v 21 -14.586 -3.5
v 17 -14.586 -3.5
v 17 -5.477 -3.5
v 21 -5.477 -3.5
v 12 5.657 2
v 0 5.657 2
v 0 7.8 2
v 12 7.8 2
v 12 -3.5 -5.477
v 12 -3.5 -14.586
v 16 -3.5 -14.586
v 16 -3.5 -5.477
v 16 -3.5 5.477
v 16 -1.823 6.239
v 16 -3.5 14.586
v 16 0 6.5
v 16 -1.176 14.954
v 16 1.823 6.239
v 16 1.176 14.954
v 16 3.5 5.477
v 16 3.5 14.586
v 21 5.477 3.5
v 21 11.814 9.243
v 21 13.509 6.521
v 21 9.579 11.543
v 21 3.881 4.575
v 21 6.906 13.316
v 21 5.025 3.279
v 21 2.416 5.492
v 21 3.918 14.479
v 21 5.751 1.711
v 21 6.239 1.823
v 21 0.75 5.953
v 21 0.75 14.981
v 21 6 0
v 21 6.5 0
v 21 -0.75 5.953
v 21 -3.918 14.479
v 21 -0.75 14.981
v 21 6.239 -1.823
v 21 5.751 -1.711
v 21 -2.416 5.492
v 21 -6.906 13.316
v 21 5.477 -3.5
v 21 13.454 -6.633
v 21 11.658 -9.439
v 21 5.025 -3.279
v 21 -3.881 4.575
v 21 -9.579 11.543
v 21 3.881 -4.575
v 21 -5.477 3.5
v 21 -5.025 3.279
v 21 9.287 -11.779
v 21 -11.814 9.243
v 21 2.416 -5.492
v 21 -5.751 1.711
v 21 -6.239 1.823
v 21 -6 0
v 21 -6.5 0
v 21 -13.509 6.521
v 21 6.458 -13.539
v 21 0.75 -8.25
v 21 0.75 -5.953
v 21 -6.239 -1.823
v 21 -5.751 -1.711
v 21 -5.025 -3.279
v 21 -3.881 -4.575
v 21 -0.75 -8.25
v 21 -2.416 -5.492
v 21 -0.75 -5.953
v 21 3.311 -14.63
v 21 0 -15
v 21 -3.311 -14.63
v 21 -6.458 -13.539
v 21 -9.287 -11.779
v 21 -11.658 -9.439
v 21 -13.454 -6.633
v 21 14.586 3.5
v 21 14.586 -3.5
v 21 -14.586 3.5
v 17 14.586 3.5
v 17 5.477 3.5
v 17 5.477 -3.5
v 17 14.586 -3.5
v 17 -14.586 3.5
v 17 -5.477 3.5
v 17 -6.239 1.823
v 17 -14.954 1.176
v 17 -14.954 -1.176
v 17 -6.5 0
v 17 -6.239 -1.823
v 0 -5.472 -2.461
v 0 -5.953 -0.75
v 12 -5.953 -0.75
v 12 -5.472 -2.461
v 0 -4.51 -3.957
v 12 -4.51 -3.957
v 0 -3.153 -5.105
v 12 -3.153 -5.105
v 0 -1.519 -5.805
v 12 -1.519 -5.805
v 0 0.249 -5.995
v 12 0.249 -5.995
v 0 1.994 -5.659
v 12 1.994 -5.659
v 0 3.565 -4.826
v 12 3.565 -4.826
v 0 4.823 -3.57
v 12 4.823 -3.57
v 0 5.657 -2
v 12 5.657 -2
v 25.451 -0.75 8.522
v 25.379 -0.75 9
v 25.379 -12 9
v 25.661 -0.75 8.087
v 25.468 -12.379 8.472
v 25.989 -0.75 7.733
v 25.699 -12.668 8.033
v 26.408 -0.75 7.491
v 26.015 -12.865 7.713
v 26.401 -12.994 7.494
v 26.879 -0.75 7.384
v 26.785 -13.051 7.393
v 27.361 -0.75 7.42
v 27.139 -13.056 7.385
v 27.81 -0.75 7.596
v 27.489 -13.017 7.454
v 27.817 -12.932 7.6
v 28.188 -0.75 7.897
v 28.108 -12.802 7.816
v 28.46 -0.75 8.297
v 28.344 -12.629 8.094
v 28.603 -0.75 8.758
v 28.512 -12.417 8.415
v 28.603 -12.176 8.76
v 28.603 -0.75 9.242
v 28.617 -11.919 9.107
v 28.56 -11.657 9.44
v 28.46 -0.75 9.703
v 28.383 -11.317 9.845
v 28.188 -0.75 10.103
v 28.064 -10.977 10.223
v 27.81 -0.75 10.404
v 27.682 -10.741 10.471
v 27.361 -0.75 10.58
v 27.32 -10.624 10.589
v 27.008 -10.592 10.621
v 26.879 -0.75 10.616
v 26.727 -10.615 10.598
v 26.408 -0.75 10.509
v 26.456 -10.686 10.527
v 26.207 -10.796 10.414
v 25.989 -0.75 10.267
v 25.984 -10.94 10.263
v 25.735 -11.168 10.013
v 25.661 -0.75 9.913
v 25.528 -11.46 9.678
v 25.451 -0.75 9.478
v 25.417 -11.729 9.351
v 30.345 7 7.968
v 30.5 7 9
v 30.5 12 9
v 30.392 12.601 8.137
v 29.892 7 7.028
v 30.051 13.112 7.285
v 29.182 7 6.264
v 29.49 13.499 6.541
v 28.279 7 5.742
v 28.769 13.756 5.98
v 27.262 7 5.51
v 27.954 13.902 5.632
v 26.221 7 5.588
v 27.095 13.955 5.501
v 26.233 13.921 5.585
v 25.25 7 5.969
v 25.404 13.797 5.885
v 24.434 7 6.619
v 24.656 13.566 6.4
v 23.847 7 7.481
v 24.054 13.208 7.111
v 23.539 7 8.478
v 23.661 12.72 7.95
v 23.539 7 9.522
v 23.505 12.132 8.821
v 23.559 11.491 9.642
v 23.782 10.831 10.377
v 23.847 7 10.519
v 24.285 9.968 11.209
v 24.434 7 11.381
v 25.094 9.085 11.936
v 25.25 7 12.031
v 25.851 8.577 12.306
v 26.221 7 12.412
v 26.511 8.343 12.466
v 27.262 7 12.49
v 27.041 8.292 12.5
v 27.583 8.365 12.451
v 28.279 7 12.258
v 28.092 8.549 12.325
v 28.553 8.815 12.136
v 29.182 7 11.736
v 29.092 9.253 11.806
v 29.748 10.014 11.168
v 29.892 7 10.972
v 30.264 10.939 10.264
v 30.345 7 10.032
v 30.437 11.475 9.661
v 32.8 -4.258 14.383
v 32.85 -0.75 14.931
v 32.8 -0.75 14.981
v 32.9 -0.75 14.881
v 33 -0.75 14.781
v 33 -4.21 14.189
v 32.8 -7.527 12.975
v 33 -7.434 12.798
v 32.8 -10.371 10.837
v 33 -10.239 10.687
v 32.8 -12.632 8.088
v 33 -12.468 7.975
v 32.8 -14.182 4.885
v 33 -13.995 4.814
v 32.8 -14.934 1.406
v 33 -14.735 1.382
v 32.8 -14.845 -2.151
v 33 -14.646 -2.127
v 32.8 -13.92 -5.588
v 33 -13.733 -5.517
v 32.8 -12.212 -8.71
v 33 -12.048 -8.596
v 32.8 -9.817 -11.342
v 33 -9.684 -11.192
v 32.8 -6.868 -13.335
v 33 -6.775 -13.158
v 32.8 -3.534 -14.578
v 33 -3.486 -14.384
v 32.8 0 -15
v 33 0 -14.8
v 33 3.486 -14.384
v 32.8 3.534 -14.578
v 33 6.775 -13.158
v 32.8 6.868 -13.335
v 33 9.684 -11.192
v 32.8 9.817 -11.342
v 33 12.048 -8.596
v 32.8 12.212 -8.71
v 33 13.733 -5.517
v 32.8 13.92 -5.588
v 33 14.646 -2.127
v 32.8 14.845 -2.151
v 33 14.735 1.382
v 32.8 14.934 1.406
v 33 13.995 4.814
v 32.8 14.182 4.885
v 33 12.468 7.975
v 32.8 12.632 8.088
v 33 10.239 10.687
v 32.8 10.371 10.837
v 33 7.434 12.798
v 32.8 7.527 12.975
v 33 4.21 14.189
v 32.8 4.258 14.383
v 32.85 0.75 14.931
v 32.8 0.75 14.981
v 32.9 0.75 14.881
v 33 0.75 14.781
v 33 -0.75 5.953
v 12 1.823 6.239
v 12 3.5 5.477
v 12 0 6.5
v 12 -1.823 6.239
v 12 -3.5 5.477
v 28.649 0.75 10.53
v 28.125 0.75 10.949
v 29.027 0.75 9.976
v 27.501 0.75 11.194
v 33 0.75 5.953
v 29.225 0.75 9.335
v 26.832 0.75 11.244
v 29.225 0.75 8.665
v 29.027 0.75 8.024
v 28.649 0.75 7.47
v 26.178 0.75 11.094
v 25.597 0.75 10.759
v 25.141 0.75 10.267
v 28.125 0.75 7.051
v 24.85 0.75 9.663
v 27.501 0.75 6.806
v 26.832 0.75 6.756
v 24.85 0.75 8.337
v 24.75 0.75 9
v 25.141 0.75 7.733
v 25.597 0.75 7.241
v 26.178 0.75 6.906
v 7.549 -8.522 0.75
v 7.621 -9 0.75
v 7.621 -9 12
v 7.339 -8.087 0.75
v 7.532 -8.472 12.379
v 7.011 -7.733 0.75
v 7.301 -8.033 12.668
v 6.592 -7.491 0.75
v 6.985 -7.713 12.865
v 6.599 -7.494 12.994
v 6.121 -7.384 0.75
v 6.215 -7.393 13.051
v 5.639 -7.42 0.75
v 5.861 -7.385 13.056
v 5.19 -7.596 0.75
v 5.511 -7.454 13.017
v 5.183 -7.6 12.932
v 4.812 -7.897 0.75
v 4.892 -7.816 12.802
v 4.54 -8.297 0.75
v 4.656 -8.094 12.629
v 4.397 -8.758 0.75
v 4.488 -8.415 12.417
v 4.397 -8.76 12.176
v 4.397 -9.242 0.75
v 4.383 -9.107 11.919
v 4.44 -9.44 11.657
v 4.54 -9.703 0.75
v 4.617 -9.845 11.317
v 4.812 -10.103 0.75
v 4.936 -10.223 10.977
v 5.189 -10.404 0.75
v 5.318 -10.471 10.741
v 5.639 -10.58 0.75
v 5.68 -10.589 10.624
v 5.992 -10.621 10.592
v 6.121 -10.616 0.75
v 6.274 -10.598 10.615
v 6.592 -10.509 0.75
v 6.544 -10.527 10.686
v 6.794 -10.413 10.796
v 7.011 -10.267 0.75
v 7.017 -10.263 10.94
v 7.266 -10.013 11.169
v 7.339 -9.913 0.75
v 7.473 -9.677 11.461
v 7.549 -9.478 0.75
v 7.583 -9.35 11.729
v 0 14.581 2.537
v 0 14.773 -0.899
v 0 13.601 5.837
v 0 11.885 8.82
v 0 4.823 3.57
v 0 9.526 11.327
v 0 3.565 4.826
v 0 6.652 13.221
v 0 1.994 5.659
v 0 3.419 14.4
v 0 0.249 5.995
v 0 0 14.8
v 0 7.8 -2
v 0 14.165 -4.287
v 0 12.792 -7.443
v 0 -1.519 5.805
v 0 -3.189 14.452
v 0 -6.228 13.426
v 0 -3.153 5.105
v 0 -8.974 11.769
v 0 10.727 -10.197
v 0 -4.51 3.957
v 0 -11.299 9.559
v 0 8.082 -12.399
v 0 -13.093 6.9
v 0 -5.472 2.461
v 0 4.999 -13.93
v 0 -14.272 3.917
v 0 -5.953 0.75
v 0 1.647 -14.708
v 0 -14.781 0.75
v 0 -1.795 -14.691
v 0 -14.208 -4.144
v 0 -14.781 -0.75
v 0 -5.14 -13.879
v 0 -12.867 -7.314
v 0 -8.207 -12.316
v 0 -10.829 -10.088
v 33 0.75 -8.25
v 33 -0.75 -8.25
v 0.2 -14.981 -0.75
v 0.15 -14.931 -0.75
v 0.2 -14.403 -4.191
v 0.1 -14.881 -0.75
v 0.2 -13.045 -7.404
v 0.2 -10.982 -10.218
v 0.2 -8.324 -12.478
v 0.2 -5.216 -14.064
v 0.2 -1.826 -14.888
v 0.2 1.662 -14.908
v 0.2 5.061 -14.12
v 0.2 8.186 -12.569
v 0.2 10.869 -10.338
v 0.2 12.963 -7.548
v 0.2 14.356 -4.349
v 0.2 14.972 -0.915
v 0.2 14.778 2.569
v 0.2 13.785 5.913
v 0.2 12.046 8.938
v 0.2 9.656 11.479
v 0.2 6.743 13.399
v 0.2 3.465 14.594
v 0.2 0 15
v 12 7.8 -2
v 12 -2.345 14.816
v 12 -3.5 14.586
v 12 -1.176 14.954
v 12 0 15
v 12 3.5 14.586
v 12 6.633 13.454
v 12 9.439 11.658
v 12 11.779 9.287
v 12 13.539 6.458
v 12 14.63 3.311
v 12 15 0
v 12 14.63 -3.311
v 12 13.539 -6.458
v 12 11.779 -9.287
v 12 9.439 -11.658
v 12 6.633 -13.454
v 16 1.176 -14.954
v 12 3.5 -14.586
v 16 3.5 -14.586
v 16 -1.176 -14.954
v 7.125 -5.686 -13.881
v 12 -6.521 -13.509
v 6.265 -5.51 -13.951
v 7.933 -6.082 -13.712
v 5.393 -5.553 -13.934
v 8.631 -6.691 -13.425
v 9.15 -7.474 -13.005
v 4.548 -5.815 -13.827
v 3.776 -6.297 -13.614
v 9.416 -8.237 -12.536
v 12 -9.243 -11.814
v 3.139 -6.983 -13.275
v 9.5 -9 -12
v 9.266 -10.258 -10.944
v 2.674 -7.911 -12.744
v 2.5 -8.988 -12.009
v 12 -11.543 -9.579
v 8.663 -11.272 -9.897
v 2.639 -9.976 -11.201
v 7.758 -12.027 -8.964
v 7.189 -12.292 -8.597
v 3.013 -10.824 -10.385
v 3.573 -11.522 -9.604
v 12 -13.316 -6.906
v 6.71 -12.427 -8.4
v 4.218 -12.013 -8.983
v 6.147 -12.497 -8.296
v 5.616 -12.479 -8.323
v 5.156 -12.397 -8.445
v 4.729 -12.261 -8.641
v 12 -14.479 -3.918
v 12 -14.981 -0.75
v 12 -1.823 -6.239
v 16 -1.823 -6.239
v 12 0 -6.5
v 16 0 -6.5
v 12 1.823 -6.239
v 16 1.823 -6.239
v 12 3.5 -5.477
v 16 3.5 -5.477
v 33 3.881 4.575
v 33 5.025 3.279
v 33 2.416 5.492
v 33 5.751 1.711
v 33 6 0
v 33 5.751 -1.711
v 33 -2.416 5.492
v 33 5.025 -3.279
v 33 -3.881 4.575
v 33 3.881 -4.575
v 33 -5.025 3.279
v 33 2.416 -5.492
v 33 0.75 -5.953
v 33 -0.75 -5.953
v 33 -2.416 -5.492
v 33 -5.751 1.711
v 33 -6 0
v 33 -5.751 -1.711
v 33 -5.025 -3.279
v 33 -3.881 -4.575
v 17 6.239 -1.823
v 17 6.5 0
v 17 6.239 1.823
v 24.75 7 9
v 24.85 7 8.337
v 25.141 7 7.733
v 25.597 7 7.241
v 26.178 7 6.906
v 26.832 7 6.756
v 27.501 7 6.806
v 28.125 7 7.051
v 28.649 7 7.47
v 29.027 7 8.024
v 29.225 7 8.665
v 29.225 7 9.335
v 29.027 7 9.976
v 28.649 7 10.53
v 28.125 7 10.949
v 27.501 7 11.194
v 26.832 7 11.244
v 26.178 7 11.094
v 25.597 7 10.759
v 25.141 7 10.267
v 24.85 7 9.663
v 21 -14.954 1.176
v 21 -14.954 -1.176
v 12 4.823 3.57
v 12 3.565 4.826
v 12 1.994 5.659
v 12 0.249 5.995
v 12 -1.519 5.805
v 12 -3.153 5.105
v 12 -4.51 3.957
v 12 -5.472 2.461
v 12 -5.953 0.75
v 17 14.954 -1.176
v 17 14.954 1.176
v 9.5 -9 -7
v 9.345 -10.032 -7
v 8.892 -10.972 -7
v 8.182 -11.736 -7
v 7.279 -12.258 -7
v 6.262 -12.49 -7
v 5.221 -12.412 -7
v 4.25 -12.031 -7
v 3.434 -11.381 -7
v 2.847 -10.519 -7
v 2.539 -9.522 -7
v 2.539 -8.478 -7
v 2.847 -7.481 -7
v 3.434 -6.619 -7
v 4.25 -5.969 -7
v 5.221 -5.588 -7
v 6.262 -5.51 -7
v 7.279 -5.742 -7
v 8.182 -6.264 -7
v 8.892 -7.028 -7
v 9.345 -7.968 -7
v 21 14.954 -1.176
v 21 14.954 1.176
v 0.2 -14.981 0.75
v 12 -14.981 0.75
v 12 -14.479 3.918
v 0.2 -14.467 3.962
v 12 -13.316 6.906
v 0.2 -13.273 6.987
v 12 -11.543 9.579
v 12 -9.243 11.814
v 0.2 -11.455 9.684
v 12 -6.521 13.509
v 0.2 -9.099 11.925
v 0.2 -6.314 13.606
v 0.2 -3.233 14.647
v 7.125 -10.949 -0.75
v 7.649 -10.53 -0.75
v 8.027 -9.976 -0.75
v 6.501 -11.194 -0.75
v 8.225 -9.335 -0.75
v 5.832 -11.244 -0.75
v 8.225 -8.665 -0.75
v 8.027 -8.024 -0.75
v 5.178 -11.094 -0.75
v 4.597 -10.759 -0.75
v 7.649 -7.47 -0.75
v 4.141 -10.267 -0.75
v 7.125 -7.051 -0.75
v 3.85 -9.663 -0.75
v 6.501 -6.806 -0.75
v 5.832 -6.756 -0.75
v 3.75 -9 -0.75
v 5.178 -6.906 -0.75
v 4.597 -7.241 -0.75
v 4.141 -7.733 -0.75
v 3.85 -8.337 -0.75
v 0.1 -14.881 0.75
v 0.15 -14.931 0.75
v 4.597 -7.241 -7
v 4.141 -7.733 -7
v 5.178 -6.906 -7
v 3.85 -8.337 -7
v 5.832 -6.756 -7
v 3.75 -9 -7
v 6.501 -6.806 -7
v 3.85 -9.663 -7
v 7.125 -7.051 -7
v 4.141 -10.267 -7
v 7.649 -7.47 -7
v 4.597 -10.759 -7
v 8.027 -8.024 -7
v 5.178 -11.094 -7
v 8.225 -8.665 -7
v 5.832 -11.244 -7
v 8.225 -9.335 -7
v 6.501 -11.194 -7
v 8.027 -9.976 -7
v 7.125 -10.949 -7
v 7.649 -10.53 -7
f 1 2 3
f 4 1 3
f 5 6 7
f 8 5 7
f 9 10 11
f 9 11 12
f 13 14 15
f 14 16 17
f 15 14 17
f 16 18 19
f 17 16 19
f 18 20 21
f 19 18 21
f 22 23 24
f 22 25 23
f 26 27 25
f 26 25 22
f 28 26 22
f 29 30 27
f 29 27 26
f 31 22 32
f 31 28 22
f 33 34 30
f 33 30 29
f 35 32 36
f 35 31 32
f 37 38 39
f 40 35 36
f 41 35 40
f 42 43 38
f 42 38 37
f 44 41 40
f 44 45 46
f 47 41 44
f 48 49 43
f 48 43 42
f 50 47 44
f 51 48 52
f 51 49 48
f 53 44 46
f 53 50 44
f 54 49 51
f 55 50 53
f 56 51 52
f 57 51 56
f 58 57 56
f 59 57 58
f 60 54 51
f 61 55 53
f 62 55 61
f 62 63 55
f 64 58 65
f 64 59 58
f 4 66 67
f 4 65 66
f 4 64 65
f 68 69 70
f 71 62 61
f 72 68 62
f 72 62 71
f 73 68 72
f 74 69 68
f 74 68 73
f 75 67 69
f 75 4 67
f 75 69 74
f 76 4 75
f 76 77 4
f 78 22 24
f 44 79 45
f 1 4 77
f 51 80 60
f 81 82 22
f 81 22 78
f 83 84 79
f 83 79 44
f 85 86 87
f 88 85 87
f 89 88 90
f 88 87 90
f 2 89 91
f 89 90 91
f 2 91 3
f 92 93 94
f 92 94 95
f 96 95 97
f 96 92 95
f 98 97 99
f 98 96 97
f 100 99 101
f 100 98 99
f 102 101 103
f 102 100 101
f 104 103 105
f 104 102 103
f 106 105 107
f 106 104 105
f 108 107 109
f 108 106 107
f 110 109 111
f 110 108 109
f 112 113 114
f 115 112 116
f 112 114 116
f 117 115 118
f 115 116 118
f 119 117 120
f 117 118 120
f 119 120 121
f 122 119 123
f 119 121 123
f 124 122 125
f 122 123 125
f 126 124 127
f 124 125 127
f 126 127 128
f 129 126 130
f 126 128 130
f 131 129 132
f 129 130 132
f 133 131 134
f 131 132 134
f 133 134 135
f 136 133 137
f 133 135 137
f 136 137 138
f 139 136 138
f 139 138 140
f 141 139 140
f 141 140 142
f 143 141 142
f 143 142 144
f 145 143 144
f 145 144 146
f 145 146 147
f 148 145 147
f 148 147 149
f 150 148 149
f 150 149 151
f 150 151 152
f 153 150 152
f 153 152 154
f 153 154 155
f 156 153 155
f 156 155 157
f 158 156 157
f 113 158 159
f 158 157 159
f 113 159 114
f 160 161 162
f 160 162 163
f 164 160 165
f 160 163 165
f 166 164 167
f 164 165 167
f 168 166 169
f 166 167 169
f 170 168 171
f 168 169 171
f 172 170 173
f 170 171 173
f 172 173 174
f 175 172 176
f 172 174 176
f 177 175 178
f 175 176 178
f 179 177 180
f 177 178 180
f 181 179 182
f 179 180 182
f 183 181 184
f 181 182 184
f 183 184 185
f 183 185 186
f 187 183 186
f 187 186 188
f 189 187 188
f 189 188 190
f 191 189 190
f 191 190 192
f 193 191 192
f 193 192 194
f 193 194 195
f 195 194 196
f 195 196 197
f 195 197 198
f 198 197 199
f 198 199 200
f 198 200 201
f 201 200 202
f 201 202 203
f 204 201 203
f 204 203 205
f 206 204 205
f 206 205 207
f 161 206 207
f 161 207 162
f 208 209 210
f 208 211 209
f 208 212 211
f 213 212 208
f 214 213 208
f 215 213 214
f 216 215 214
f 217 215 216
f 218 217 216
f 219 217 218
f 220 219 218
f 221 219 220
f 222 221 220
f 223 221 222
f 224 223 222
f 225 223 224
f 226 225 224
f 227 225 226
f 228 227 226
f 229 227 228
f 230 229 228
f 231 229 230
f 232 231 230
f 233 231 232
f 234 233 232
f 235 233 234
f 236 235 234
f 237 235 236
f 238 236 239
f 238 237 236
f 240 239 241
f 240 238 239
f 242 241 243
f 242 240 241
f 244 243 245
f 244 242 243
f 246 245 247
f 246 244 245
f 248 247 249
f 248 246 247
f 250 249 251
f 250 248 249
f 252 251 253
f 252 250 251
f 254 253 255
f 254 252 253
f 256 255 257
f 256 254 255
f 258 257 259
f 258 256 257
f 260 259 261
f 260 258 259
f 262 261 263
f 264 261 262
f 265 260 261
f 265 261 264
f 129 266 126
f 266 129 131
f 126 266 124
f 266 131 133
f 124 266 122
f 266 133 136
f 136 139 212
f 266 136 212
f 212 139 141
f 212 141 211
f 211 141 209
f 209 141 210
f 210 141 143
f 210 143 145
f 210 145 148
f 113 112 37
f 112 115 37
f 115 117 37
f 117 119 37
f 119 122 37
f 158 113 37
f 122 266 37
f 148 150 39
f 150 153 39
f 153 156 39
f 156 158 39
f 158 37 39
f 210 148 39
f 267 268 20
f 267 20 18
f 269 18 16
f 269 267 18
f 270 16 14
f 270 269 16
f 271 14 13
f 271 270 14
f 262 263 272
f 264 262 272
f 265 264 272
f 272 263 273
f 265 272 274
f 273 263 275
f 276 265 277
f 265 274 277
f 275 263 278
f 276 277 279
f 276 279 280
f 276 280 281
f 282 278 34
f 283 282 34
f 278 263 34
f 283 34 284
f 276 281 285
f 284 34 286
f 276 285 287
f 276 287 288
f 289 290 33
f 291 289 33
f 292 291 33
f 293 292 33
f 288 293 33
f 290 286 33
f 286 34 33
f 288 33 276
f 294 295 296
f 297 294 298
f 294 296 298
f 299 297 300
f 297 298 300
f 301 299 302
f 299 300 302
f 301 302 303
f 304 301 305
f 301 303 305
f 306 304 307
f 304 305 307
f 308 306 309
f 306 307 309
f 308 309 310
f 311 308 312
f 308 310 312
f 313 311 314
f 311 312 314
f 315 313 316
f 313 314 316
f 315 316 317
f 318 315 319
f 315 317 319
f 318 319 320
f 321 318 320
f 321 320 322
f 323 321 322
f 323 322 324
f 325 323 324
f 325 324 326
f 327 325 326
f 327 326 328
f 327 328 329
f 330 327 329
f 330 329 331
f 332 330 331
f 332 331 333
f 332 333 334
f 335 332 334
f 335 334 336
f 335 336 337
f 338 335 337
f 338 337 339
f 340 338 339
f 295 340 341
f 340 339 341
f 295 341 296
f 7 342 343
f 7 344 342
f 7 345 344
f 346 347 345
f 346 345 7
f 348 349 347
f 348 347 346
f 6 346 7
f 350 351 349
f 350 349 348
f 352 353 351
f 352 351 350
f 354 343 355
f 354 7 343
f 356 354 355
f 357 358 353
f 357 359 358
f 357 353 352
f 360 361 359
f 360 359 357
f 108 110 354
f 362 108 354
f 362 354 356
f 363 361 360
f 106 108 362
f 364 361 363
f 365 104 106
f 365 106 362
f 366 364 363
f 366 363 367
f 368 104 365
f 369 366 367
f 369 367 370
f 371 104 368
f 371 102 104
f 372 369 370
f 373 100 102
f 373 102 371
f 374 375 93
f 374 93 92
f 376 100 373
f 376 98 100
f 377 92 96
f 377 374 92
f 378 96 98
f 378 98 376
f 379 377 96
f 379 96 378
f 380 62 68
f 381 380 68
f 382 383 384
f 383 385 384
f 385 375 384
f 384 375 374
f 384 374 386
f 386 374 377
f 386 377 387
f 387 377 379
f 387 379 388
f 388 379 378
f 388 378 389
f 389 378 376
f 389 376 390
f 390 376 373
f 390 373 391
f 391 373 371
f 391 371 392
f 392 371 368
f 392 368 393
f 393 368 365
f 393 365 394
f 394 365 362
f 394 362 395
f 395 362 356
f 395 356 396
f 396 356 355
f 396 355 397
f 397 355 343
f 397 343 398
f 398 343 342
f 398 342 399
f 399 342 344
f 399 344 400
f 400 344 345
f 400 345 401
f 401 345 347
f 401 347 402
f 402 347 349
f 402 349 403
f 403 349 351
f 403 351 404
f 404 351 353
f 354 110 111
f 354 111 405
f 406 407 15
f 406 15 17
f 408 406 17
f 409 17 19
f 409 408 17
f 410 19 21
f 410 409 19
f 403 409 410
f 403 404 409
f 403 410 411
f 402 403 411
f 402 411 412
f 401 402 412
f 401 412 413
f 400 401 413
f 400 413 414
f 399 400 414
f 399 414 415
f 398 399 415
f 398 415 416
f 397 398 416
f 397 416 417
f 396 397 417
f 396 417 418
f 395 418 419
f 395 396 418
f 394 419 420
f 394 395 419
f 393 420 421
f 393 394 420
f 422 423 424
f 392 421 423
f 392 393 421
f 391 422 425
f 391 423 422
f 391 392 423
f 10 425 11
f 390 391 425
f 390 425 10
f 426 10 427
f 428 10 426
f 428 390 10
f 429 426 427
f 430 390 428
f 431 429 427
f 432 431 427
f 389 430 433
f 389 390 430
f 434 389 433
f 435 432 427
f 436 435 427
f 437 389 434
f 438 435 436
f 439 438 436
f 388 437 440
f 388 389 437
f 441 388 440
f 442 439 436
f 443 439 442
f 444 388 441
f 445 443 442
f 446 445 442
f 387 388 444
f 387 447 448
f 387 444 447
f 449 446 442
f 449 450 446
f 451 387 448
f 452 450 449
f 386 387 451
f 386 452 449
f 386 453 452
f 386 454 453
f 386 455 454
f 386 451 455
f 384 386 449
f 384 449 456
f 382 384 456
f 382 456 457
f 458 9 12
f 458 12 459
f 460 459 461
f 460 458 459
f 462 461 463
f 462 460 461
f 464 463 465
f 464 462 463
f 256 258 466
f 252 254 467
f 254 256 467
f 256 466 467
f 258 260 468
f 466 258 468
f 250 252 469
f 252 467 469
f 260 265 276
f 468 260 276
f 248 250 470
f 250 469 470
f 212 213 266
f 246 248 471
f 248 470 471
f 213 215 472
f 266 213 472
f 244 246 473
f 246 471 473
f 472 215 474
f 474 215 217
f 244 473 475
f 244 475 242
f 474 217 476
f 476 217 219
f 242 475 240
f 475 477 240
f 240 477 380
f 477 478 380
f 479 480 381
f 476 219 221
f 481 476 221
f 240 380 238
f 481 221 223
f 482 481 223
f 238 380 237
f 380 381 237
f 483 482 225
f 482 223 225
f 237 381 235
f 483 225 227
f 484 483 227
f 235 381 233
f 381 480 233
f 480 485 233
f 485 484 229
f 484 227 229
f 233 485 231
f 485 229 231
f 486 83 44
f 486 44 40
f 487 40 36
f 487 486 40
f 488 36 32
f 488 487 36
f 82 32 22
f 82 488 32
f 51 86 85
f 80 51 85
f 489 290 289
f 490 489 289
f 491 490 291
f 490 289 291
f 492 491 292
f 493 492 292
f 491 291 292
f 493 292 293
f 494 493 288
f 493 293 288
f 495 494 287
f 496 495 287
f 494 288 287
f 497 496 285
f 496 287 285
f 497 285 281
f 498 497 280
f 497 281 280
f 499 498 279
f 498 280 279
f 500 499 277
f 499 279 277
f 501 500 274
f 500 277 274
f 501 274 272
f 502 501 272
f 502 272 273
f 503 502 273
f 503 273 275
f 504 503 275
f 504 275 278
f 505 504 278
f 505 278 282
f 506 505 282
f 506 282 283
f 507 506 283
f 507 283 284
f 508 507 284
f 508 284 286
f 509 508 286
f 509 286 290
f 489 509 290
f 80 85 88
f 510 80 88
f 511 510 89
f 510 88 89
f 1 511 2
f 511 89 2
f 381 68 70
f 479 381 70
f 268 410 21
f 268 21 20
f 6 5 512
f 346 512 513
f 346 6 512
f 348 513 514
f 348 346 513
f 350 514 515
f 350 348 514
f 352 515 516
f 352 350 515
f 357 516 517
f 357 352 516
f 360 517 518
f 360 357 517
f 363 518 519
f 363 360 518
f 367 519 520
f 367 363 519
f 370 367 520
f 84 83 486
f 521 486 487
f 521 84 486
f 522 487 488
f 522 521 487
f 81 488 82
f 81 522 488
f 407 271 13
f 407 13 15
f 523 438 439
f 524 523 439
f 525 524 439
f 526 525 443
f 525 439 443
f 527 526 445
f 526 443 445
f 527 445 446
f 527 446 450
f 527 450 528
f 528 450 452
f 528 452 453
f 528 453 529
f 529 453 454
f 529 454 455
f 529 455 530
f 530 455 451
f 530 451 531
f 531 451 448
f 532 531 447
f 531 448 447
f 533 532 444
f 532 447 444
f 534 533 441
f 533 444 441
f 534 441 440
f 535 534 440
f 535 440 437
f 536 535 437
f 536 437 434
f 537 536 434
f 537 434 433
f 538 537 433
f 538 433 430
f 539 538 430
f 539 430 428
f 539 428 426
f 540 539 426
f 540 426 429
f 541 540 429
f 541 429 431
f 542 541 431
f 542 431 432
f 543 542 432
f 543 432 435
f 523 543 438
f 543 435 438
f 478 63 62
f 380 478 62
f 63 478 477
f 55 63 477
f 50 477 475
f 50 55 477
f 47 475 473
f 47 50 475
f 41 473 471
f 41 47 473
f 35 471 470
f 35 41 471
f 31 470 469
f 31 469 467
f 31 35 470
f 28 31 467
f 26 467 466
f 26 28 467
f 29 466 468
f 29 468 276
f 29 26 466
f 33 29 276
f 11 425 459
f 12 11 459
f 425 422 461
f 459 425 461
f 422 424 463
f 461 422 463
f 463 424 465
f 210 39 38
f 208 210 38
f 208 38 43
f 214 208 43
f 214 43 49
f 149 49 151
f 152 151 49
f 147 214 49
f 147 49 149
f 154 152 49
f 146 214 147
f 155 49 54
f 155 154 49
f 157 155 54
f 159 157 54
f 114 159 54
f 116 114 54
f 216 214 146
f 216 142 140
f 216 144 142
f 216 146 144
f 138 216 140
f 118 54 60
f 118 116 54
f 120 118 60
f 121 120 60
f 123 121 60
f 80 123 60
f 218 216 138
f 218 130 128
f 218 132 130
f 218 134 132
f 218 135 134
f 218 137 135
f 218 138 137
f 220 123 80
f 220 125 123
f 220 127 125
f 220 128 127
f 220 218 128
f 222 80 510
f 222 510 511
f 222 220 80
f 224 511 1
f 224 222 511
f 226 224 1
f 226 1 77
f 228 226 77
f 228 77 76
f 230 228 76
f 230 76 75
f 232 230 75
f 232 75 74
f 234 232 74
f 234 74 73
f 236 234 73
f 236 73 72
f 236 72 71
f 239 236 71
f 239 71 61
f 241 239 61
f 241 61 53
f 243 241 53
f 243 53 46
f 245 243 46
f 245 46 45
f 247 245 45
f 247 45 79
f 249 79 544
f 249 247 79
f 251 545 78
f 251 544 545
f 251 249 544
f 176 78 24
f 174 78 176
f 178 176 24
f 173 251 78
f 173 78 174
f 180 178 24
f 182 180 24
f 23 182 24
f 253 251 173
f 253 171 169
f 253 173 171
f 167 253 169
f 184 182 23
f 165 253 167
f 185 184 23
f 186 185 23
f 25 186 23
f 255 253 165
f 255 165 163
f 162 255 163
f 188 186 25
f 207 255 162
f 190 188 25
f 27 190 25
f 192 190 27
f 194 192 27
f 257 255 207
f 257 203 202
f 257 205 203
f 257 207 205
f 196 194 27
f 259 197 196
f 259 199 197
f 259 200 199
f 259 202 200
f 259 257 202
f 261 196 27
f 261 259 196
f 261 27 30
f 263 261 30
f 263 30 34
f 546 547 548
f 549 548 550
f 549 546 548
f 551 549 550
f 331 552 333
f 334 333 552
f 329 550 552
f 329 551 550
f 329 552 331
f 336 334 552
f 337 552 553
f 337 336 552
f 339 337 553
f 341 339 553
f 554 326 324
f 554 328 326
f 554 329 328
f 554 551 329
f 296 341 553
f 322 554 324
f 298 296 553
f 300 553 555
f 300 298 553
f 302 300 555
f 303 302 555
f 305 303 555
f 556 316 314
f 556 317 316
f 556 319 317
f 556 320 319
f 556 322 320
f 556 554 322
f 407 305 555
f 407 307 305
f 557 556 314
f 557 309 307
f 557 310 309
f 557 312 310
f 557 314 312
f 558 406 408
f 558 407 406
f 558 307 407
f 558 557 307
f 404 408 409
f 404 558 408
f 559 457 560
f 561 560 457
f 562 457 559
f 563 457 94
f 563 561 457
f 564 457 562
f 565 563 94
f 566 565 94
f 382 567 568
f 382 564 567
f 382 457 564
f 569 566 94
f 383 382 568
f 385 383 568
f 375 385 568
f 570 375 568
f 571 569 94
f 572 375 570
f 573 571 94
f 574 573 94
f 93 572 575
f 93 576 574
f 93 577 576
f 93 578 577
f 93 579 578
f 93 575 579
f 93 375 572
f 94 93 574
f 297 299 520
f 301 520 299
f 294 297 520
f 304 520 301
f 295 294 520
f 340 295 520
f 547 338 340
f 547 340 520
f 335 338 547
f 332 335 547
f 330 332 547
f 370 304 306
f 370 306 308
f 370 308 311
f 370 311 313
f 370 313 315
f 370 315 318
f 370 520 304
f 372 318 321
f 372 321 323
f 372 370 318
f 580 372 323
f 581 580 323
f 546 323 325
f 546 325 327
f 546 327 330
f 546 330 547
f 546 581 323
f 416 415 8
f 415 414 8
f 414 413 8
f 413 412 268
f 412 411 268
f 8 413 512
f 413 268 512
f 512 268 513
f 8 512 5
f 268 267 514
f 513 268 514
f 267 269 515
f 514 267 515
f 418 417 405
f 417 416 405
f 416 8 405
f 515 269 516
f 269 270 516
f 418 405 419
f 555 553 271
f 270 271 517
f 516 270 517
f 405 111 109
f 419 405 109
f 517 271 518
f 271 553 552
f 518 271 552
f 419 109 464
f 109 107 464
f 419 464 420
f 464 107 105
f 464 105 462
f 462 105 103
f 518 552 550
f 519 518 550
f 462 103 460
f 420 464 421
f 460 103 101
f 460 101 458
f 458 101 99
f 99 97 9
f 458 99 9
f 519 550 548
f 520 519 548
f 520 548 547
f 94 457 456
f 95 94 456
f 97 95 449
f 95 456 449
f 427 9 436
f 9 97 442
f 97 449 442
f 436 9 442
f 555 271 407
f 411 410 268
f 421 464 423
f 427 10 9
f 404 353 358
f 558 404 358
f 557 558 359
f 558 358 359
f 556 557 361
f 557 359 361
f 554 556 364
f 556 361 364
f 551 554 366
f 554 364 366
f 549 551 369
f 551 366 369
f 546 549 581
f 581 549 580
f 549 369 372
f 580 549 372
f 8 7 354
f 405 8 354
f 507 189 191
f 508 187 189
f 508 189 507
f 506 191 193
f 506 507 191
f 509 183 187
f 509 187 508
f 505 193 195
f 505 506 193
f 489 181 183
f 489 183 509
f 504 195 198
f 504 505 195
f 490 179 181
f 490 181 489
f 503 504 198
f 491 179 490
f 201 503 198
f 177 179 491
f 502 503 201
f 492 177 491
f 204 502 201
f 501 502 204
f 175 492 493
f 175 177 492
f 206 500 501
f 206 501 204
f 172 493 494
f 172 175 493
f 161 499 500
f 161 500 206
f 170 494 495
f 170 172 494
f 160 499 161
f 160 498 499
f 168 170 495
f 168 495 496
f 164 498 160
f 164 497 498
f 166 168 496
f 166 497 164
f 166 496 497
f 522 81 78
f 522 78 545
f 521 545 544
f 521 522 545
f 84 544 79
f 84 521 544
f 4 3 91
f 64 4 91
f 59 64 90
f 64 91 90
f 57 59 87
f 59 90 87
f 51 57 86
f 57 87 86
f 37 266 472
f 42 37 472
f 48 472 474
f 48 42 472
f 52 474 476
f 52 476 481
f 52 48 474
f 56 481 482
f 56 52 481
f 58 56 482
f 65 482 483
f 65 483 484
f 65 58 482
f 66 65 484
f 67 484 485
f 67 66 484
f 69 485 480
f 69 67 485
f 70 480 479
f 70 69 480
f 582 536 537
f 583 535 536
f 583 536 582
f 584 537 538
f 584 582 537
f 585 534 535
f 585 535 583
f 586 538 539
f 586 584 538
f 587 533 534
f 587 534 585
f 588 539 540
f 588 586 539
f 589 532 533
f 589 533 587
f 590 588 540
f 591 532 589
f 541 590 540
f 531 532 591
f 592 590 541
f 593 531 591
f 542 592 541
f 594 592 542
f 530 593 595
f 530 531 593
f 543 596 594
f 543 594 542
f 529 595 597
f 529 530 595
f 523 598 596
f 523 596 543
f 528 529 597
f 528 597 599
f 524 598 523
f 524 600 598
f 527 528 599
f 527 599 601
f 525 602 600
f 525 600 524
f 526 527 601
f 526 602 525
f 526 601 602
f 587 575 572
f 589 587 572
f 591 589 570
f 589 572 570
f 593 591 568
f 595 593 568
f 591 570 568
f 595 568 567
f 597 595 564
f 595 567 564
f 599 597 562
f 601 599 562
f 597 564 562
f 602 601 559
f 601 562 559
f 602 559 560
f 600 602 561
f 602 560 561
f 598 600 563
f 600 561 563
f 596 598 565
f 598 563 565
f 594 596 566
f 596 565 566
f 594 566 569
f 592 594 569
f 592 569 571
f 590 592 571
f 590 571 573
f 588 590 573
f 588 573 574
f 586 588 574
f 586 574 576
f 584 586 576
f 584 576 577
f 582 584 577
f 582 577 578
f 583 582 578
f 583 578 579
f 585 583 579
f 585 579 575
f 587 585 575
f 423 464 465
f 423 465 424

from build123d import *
from build123d.topology import SkipClean

# Parameters (mm, degrees)
SKETCH1_W                          = 12
SKETCH1_H                          = 15
BOSS_EXTRUDE1_DEPTH                = 4
BOSS_EXTRUDE2_START                = 4
BOSS_EXTRUDE2_DEPTH                = 4
SKETCH4_R                          = 6
CUT_EXTRUDE1_DEPTH                 = 16
CUT_EXTRUDE2_START                 = -16
SKETCH5_R                          = 6
CUT_EXTRUDE2_DEPTH                 = 16
CUT_EXTRUDE3_DEPTH                 = 12
CUT_EXTRUDE4_START                 = -12
CUT_EXTRUDE4_DEPTH                 = 12
SOCKET_HEAD_CAP_SCREW1_D           = 4.5
SOCKET_HEAD_CAP_SCREW1_DEPTH       = 14.25
SOCKET_HEAD_CAP_SCREW1_CBORE_D     = 7
SOCKET_HEAD_CAP_SCREW1_CBORE_DEPTH = 8
TAP1_D                             = 3.242
SOCKET_HEAD_CAP_SCREW2_D           = 4.5
SOCKET_HEAD_CAP_SCREW2_DEPTH       = 14.25
SOCKET_HEAD_CAP_SCREW2_CBORE_D     = 7
SOCKET_HEAD_CAP_SCREW2_CBORE_DEPTH = 8
TAP2_D                             = 3.242
CHAMFER1_SIZE                      = 0.2
CHAMFER2_SIZE                      = 0.2
DELETEFACE1_DEPTH                  = 12
CUT_EXTRUDE5_REACH                 = 41.23
SKETCH16_W                         = 4
SKETCH16_H                         = 7.8


# Read off the part's stored shape, not the designer's step: DeleteFace1
with BuildPart() as part:
    # Sketch1 → Revolve1 (revolve)
    with BuildSketch(Plane.XY, mode=Mode.PRIVATE) as revolve1_sk:
        with Locations((6, 7.5)):
            Rectangle(SKETCH1_W, SKETCH1_H)
        with Locations((27, 7.5)):
            Rectangle(SKETCH1_W, SKETCH1_H)
    revolve(revolve1_sk.sketch.rotate(Axis((0, 0, 0), (1, 0, 0)), 90), axis=Axis((0, 0, 0), (1, 0, 0)))

    # Sketch2 → Boss-Extrude1 (add)
    with SkipClean():  # the faces are left unmerged after this step: merging them gives an invalid solid
        with BuildSketch(Plane(origin=(12, 0, 0), x_dir=(0, 0, -1), z_dir=(1, 0, 0))):
            with BuildLine():
                Line((-14.585952146, 3.5), (-5.477225575, 3.5))
                ThreePointArc((-5.477225575, 3.5), (-6.5, 0), (-5.477225575, -3.5))
                Line((-5.477225575, -3.5), (-14.585952146, -3.5))
                ThreePointArc((-14.585952146, -3.5), (-15, 0), (-14.585952146, 3.5))
            make_face()
            with BuildLine():
                Line((5.477225575, 3.5), (14.585952146, 3.5))
                ThreePointArc((14.585952146, 3.5), (15, 0), (14.585952146, -3.5))
                Line((14.585952146, -3.5), (5.477225575, -3.5))
                ThreePointArc((5.477225575, -3.5), (6.5, 0), (5.477225575, 3.5))
            make_face()
        extrude(amount=BOSS_EXTRUDE1_DEPTH)

    # Sketch3 → Boss-Extrude2 (add)
    with SkipClean():  # the faces are left unmerged after this step: merging them gives an invalid solid
        with BuildSketch(Plane.ZY.offset(-21).offset(BOSS_EXTRUDE2_START)):
            with BuildLine():
                Line((-3.5, 14.585952146), (-3.5, 5.477225575))
                ThreePointArc((-3.5, 5.477225575), (0, 6.5), (3.5, 5.477225575))
                Line((3.5, 5.477225575), (3.5, 14.585952146))
                ThreePointArc((3.5, 14.585952146), (0, 15), (-3.5, 14.585952146))
            make_face()
            with BuildLine():
                Line((3.5, -5.477225575), (3.5, -14.585952146))
                ThreePointArc((3.5, -14.585952146), (0, -15), (-3.5, -14.585952146))
                Line((-3.5, -14.585952146), (-3.5, -5.477225575))
                ThreePointArc((-3.5, -5.477225575), (0, -6.5), (3.5, -5.477225575))
            make_face()
        extrude(amount=-BOSS_EXTRUDE2_DEPTH)

    # Sketch4 → Cut-Extrude1 (cut)
    with SkipClean():  # the faces are left unmerged after this step: merging them gives an invalid solid
        with BuildSketch(Plane(origin=(0, 0, 0), x_dir=(0, 0, -1), z_dir=(1, 0, 0))):
            with Locations(Location((0, 0, 0), (0, 0, 180))):
                Circle(SKETCH4_R)
        extrude(amount=CUT_EXTRUDE1_DEPTH, mode=Mode.SUBTRACT)

    # Sketch5 → Cut-Extrude2 (cut)
    with SkipClean():  # the faces are left unmerged after this step: merging them gives an invalid solid
        with BuildSketch(Plane(origin=(33, 0, 0), x_dir=(0, 0, -1), z_dir=(1, 0, 0)).offset(CUT_EXTRUDE2_START)):
            Circle(SKETCH5_R)
        extrude(amount=CUT_EXTRUDE2_DEPTH, mode=Mode.SUBTRACT)

    # Sketch6 → Cut-Extrude3 (cut)
    with SkipClean():  # the faces are left unmerged after this step: merging them gives an invalid solid
        with BuildSketch(Plane(origin=(0, 0, 0), x_dir=(0, 0, -1), z_dir=(1, 0, 0))):
            with BuildLine():
                Line((0.75, -14.981238267), (0.75, 8.25))
                Line((0.75, 8.25), (-0.75, 8.25))
                Line((-0.75, 8.25), (-0.75, -14.981238267))
                ThreePointArc((-0.75, -14.981238267), (0, -15), (0.75, -14.981238267))
            make_face()
        extrude(amount=CUT_EXTRUDE3_DEPTH, mode=Mode.SUBTRACT)

    # Sketch7 → Cut-Extrude4 (cut)
    with SkipClean():  # the faces are left unmerged after this step: merging them gives an invalid solid
        with BuildSketch(Plane(origin=(33, 0, 0), x_dir=(0, 0, -1), z_dir=(1, 0, 0)).offset(CUT_EXTRUDE4_START)):
            with BuildLine():
                Line((-14.981238267, 0.75), (8.25, 0.75))
                Line((8.25, 0.75), (8.25, -0.75))
                Line((8.25, -0.75), (-14.981238267, -0.75))
                ThreePointArc((-14.981238267, -0.75), (-15, 0), (-14.981238267, 0.75))
            make_face()
        extrude(amount=CUT_EXTRUDE4_DEPTH, mode=Mode.SUBTRACT)

    # Socket Head Cap Screw1
    with Locations(Plane(origin=(0, 0, -15), x_dir=(1, 0, 0), z_dir=(0, 0, -1))):
        with Locations((6, 9)):
            CounterBoreHole(SOCKET_HEAD_CAP_SCREW1_D / 2, SOCKET_HEAD_CAP_SCREW1_CBORE_D / 2, SOCKET_HEAD_CAP_SCREW1_CBORE_DEPTH, depth=SOCKET_HEAD_CAP_SCREW1_DEPTH)

    # Tap1 (through all)
    with Locations(Plane(origin=(0, 0, 0.75), x_dir=(-1, 0, 0), z_dir=(0, 0, -1))):
        with Locations((-6, -9)):
            Hole(TAP1_D / 2)

    # Socket Head Cap Screw2
    with Locations(Plane(origin=(0, 15, 0), x_dir=(1, 0, 0), z_dir=(0, 1, 0))):
        with Locations((27, -9)):
            CounterBoreHole(SOCKET_HEAD_CAP_SCREW2_D / 2, SOCKET_HEAD_CAP_SCREW2_CBORE_D / 2, SOCKET_HEAD_CAP_SCREW2_CBORE_DEPTH, depth=SOCKET_HEAD_CAP_SCREW2_DEPTH)

    # Tap2 (through all)
    with Locations(Plane(origin=(0, -0.75, 0), x_dir=(1, 0, 0), z_dir=(0, 1, 0))):
        with Locations((27, -9)):
            Hole(TAP2_D / 2)

    # Chamfer1
    chamfer1_edges = [part.edges().sort_by_distance(p)[0] for p in [
        (0, 10.86853256, -10.338036564),
    ]]
    chamfer(chamfer1_edges, length=CHAMFER1_SIZE)

    # Chamfer2
    chamfer2_edges = [part.edges().sort_by_distance(p)[0] for p in [
        (33, 0, -15),
    ]]
    chamfer(chamfer2_edges, length=CHAMFER2_SIZE)

    # DeleteFace1 outline → DeleteFace1 (add)
    with SkipClean():  # the faces are left unmerged after this step: merging them gives an invalid solid
        with BuildSketch(Plane.YZ):
            with BuildLine():
                Line((8.25, 0.75), (5.95294045, 0.75))
                ThreePointArc((5.95294045, 0.75), (6, 0), (5.95294045, -0.75))
                Line((5.95294045, -0.75), (8.25, -0.75))
                Line((8.25, -0.75), (8.25, 0.75))
            make_face()
        extrude(amount=DELETEFACE1_DEPTH)

    # Sketch16 → Cut-Extrude5 (cut, up to next)
    with BuildSketch(Plane(origin=(0, 0, 0), x_dir=(0, 0, -1), z_dir=(1, 0, 0)), mode=Mode.PRIVATE) as cut_extrude5_sk1:
        with Locations((0, 3.9)):
            Rectangle(SKETCH16_W, SKETCH16_H)
    cut_extrude5_tool1 = extrude(cut_extrude5_sk1.sketch, amount=CUT_EXTRUDE5_REACH, mode=Mode.PRIVATE) & part.part
    add(cut_extrude5_tool1.solids().sort_by_distance((0, 3.9, 0))[0], mode=Mode.SUBTRACT)


solid = part.part
